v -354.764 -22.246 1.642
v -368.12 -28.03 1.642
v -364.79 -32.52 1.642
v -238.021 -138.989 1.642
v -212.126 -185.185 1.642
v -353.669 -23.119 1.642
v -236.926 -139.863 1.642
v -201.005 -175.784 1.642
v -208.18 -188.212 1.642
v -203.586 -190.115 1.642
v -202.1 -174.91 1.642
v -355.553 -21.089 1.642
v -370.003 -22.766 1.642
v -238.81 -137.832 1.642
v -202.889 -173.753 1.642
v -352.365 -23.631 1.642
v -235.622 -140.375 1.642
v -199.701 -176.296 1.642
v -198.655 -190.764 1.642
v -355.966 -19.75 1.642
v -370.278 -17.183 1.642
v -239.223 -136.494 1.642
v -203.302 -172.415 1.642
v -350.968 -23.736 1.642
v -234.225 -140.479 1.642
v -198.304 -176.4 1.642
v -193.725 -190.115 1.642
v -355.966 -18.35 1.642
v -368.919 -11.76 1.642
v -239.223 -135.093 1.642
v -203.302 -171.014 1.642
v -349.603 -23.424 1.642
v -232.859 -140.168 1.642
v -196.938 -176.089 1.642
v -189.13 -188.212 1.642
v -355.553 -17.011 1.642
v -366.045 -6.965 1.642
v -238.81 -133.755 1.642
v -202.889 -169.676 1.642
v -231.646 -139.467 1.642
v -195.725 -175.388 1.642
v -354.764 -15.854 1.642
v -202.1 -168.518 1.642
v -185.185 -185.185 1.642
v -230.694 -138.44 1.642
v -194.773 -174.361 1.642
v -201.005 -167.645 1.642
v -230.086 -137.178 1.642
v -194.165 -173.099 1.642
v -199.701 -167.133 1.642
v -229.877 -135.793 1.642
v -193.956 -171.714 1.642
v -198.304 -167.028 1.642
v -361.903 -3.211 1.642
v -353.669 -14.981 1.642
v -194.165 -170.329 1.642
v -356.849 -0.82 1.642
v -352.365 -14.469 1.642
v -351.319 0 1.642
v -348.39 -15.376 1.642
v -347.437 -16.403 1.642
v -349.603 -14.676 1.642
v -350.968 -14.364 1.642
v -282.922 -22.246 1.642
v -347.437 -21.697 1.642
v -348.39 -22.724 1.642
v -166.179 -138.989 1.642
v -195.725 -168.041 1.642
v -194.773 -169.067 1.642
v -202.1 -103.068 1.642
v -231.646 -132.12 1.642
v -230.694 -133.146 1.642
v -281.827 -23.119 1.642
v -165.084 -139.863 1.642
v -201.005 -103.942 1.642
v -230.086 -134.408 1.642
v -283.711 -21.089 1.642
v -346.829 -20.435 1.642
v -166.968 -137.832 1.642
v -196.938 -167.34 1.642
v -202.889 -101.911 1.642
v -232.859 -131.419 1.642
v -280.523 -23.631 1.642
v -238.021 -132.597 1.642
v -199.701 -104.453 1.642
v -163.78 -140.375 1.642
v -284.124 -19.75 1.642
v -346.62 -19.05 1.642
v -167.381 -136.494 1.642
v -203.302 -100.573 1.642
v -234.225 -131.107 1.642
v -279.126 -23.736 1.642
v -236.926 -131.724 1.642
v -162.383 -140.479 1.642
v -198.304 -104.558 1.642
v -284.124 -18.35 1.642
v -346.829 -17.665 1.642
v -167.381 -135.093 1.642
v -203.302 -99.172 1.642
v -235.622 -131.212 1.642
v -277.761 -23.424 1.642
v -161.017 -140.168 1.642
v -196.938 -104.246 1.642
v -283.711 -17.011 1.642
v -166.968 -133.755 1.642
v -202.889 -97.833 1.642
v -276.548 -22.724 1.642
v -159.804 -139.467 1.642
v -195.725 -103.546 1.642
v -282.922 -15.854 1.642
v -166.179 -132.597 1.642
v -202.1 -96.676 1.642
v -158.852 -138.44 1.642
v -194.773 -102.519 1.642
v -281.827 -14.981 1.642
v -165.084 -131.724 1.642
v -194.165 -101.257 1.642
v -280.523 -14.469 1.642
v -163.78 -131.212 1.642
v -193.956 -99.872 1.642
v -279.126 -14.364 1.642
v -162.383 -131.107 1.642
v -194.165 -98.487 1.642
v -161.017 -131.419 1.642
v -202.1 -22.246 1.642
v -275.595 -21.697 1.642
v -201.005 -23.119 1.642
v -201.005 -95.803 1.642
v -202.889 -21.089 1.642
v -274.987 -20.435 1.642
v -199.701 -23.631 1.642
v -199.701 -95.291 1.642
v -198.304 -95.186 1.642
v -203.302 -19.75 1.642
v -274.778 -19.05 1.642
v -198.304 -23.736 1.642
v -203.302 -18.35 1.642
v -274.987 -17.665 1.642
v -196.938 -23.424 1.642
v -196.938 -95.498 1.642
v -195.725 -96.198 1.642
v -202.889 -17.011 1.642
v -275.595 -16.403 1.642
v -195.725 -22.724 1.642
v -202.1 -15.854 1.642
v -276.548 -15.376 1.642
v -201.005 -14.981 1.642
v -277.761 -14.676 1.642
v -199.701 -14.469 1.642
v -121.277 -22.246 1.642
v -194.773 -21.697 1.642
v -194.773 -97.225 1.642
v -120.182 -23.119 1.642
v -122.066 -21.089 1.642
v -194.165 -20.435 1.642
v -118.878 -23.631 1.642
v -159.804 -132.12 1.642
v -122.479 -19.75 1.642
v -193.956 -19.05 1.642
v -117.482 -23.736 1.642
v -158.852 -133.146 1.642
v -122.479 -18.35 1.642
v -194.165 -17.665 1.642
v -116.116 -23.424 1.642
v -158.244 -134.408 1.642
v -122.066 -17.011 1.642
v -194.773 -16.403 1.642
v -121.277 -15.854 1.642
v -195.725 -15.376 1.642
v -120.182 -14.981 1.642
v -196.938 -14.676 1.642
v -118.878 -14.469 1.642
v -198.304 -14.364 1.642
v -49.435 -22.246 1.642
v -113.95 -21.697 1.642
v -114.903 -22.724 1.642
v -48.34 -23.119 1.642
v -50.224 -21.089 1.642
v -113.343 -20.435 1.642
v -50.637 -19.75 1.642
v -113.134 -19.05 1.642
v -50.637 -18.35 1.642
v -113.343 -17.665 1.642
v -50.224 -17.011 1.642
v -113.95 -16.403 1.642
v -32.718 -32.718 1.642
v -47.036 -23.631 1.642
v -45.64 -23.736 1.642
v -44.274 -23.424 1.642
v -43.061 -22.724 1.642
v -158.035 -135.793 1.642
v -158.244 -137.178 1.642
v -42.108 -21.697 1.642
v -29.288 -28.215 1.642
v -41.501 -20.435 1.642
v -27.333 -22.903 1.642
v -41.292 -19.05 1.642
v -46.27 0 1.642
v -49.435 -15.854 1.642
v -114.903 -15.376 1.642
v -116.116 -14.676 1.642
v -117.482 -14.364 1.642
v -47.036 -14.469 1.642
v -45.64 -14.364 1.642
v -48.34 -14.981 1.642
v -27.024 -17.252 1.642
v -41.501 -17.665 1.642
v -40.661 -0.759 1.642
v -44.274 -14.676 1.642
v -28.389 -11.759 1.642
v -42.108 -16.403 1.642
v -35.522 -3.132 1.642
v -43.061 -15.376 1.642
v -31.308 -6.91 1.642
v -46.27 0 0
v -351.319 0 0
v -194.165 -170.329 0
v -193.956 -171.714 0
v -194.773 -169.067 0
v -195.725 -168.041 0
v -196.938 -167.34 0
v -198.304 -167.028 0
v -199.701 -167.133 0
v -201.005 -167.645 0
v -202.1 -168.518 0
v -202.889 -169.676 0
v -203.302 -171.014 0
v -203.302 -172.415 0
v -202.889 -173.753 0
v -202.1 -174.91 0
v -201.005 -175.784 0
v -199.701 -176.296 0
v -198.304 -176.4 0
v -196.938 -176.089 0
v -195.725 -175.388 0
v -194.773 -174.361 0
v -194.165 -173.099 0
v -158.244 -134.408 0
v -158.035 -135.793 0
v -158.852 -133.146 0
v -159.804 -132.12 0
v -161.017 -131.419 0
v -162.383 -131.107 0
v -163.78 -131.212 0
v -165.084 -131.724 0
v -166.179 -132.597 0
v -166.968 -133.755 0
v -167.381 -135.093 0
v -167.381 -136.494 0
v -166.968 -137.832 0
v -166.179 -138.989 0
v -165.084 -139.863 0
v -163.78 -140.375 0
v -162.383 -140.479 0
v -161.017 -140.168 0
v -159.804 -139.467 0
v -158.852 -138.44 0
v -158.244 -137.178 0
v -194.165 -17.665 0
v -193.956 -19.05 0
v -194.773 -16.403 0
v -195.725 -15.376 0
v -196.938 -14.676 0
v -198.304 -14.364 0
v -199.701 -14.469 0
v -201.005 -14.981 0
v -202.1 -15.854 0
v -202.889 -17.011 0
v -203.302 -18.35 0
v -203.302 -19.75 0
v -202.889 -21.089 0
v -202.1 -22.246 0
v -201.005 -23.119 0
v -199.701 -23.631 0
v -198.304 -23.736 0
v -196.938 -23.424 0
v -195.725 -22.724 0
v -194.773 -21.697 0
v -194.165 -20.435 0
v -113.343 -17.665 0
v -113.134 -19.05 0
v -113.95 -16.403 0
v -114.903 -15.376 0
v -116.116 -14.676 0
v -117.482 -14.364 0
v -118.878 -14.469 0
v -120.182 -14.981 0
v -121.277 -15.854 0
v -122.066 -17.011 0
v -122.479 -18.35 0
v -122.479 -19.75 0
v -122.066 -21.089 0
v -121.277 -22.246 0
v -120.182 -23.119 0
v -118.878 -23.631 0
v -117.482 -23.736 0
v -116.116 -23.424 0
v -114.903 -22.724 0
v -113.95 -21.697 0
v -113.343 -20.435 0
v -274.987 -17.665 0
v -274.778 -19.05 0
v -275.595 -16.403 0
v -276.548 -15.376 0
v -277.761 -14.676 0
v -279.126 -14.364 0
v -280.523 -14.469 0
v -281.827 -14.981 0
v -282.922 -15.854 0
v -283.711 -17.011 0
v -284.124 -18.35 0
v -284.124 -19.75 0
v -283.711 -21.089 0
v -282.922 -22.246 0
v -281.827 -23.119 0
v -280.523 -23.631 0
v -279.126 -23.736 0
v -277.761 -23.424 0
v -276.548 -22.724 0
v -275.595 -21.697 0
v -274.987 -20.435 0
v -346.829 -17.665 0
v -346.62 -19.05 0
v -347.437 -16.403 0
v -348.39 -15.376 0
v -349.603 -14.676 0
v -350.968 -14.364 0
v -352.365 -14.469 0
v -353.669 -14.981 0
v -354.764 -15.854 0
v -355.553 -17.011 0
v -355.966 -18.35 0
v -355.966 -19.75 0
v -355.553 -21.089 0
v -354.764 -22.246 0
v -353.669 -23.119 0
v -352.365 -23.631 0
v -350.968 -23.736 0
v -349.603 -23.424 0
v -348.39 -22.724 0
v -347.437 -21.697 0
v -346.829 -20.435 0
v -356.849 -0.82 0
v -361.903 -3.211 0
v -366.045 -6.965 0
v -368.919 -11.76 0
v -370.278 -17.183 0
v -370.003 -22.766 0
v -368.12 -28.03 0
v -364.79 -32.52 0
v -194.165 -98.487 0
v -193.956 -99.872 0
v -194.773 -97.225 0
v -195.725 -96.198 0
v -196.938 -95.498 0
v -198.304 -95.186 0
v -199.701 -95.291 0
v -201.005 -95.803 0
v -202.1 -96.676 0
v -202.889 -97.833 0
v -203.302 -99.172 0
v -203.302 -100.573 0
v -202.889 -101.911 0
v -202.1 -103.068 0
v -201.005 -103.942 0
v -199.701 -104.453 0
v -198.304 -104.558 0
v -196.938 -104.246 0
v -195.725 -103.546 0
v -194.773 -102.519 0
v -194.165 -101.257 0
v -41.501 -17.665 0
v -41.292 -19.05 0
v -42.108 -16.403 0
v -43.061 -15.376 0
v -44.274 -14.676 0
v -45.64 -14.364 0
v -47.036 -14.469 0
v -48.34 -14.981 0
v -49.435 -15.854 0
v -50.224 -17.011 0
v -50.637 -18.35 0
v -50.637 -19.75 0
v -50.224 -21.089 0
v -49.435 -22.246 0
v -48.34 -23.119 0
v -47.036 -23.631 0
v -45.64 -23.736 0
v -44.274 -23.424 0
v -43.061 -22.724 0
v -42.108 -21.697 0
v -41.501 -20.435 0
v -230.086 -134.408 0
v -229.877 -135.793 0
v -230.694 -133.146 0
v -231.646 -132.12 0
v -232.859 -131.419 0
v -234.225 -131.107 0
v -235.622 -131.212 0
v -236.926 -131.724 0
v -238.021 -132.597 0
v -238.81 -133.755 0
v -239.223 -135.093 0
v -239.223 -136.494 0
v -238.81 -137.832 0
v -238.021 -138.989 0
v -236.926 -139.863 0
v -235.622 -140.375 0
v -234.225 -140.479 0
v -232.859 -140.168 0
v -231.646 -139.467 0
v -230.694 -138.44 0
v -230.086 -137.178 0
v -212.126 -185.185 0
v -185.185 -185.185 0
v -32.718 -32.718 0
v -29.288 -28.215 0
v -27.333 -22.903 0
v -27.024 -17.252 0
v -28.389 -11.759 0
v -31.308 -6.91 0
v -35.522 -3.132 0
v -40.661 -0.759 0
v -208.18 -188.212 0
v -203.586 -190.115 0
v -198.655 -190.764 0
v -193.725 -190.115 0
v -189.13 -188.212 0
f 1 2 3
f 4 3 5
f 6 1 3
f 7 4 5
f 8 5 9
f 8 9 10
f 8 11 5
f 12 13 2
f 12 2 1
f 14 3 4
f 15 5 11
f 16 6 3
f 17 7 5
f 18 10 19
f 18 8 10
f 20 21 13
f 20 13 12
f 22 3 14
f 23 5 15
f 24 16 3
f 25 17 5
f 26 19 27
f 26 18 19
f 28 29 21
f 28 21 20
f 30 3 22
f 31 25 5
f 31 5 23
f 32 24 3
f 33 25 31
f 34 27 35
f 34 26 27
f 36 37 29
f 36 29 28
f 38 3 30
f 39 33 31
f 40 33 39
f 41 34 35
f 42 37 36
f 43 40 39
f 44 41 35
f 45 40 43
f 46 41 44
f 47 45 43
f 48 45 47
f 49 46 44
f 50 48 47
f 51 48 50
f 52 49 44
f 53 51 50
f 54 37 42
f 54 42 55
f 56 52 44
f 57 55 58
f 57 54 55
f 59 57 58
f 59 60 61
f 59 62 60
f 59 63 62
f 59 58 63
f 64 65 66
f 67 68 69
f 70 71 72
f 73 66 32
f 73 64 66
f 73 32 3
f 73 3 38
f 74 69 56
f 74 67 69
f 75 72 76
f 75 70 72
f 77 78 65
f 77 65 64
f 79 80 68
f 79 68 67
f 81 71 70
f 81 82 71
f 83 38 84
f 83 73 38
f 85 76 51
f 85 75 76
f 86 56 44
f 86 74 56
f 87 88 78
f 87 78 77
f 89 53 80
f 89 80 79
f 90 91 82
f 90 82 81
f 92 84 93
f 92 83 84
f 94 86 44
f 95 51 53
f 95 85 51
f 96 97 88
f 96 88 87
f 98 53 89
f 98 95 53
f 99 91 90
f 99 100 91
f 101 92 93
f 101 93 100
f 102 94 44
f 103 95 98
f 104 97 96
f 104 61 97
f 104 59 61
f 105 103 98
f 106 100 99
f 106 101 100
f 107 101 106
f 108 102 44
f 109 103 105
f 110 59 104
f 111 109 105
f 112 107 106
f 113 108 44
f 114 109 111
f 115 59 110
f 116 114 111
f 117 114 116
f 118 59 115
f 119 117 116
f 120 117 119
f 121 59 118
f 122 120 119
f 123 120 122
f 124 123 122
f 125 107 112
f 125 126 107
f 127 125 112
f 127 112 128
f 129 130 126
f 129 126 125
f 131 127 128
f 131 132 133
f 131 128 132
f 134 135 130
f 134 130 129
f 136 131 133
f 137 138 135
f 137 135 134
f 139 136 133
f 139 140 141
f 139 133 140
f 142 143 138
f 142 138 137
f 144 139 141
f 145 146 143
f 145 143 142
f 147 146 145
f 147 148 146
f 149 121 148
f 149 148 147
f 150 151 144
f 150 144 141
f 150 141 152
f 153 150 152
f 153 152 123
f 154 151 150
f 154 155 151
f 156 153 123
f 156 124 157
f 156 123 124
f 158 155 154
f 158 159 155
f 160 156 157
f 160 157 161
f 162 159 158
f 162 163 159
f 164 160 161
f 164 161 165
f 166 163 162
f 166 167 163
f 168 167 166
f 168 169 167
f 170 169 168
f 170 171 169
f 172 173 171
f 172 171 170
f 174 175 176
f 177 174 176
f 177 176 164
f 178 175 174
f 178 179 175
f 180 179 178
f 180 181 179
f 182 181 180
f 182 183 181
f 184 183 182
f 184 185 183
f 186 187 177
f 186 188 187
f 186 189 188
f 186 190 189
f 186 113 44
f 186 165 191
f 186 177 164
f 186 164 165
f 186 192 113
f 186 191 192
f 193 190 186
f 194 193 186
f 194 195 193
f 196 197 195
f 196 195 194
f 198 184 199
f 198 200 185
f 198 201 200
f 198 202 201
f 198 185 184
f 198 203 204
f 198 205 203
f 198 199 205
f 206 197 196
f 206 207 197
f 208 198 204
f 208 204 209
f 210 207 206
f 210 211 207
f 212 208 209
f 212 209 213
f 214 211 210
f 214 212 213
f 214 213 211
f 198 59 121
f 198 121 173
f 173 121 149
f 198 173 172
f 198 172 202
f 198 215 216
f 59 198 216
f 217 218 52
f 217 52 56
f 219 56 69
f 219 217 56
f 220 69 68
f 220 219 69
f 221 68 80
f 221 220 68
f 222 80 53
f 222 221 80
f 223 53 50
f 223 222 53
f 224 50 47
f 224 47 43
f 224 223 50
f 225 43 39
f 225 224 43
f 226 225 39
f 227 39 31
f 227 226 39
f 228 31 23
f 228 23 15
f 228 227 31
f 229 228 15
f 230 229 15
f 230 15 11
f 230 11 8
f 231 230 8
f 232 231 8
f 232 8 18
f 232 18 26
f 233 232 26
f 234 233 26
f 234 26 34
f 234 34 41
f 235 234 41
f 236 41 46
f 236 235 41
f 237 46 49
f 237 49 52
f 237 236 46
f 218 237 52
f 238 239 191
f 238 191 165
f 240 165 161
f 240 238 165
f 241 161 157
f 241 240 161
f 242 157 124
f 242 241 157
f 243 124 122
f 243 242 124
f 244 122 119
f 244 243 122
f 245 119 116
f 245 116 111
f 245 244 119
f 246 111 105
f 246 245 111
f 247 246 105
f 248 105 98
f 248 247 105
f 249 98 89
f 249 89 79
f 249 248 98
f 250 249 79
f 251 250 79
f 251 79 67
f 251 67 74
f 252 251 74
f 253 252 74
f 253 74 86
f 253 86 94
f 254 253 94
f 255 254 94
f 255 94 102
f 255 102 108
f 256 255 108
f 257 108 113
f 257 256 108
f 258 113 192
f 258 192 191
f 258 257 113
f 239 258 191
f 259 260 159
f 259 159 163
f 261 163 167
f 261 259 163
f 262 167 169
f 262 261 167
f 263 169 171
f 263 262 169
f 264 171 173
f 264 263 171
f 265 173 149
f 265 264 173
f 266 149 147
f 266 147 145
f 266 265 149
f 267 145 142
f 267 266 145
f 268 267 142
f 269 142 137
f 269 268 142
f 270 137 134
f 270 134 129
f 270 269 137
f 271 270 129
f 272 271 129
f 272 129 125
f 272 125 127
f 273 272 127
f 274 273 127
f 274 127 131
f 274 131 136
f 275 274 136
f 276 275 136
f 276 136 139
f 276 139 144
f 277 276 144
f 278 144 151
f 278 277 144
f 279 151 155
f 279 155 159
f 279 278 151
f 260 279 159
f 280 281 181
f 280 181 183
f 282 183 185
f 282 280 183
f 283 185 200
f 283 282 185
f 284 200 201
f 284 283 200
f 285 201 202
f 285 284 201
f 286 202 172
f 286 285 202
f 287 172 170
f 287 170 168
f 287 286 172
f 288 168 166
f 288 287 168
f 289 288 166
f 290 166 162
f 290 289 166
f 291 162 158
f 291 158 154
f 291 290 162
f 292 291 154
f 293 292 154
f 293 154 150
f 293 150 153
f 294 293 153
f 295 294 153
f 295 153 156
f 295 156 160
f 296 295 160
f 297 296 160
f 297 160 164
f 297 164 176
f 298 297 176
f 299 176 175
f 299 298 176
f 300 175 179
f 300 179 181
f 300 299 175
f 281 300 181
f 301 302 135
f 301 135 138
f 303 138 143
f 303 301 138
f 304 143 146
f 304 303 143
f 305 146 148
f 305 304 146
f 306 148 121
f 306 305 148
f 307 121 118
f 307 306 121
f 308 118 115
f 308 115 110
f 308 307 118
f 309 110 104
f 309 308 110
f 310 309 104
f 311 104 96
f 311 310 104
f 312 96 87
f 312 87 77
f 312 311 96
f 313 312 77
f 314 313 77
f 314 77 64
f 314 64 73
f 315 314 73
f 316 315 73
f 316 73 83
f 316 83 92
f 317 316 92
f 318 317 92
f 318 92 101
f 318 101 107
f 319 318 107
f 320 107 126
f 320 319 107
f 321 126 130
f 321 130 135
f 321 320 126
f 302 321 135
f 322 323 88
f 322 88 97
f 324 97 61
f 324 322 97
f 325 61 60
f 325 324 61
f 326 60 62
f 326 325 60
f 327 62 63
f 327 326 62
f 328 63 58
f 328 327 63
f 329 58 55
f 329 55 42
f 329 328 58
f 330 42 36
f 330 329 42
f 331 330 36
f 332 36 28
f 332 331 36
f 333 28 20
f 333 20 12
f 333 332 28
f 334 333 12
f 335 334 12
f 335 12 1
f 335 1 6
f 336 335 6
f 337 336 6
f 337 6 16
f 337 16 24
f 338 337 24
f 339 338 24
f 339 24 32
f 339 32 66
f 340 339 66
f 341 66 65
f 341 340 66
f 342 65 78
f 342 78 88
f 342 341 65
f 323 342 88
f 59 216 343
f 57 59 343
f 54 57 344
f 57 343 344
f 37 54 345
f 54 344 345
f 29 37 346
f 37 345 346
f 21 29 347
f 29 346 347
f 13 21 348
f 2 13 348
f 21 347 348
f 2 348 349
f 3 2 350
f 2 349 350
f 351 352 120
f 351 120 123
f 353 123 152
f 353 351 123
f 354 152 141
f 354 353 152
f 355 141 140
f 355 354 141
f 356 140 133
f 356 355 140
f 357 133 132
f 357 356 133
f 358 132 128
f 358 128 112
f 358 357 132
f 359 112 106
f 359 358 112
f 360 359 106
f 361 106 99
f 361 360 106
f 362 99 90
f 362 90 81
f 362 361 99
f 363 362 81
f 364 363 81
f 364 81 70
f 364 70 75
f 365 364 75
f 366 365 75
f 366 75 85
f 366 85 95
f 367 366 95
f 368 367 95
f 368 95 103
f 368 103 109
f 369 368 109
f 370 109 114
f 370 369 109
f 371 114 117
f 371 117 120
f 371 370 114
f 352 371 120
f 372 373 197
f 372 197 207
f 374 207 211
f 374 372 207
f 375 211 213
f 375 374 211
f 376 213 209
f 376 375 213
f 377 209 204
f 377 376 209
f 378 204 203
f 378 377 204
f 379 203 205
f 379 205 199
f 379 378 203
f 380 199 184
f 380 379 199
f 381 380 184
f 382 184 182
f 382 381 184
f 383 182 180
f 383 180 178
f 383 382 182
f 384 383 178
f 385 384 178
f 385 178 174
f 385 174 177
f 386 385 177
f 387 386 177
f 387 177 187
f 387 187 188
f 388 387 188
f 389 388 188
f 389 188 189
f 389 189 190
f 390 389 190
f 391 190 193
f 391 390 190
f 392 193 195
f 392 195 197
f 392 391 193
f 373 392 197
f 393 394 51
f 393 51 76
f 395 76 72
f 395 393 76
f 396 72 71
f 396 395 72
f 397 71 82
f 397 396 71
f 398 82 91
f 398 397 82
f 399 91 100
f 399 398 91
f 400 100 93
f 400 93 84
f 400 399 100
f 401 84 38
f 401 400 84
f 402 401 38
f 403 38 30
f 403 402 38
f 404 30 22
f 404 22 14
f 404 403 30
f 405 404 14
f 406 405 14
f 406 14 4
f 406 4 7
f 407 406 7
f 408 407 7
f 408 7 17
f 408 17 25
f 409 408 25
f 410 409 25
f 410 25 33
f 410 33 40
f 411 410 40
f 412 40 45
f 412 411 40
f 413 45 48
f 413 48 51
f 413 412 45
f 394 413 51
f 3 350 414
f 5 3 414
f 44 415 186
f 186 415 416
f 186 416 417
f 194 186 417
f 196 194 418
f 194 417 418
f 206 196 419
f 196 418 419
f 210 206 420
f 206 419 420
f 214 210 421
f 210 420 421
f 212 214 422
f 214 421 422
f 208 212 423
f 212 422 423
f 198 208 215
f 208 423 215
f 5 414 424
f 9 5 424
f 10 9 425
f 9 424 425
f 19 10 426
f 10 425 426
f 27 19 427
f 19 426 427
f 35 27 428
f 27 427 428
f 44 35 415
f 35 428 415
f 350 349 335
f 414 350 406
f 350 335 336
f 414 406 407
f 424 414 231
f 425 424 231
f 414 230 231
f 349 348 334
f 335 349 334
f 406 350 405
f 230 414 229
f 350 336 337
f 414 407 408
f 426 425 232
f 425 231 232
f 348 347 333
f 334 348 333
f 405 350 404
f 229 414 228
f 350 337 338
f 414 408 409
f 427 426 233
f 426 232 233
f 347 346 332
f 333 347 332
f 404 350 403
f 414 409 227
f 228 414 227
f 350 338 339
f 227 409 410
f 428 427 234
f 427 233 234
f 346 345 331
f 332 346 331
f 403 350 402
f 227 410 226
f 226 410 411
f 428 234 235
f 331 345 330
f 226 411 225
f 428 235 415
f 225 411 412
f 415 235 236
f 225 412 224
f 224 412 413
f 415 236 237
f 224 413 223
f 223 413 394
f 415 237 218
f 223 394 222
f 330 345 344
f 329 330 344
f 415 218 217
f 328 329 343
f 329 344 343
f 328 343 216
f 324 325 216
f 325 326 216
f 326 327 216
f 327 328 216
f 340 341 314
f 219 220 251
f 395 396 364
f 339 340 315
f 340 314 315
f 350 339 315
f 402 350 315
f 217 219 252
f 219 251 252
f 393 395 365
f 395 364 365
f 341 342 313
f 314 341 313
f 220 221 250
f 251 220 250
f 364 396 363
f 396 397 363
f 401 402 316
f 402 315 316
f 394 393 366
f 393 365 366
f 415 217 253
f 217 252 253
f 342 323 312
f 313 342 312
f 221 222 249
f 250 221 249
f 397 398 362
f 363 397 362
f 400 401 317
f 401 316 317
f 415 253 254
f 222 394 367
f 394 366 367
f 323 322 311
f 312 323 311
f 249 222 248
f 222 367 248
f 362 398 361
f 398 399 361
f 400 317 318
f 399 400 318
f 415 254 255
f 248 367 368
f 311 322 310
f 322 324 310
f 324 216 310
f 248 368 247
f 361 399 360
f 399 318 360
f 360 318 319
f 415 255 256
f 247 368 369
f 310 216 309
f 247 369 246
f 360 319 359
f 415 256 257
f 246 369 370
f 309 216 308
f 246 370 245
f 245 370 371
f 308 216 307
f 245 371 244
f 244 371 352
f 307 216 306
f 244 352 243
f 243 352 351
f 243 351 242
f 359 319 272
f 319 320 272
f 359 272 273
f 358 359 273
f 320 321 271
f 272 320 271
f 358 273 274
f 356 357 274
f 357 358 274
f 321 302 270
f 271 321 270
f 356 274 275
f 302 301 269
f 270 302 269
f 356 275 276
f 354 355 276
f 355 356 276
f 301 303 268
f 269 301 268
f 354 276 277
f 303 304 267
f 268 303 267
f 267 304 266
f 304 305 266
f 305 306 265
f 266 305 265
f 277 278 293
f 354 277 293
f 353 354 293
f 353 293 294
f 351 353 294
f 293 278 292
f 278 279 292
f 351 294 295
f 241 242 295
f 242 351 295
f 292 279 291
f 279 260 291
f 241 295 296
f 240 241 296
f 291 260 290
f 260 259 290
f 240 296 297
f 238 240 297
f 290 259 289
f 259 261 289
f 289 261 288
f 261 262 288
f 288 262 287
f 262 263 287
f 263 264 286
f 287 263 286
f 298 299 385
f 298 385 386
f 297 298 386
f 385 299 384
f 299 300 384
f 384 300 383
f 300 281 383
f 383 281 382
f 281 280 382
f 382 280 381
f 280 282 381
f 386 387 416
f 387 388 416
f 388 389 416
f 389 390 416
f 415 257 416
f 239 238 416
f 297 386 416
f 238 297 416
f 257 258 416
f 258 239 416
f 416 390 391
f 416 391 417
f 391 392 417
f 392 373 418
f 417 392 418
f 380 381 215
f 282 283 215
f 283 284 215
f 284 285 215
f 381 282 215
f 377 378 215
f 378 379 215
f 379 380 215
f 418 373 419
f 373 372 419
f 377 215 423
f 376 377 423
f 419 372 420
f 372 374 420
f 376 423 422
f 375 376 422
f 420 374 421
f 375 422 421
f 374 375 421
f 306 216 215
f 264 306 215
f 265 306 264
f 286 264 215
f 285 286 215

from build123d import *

# Parameters (mm, degrees)
SKETCH1_R           = 4.699
BOSS_EXTRUDE3_DEPTH = 1.641793186


with BuildPart() as part:
    # Sketch1 → Boss-Extrude3 (new body)
    with BuildSketch(Plane.XY):
        with BuildLine():
            Line((-46.269533378, 0), (-351.31947646, 0))
            ThreePointArc((-351.31947646, 0), (-368.919381572, -11.759880611), (-364.789860651, -32.520384191))
            Line((-364.789860651, -32.520384191), (-212.125506603, -185.184738239))
            ThreePointArc((-212.125506603, -185.184738239), (-198.655122421, -190.764354058), (-185.184738239, -185.184738239))
            Line((-185.184738239, -185.184738239), (-32.717500753, -32.717500753))
            ThreePointArc((-32.717500753, -32.717500753), (-28.388979015, -11.759100083), (-46.269533378, 0))
        make_face()
        with Locations((-198.655122421, -19.05)):
            Circle(SKETCH1_R, mode=Mode.SUBTRACT)
        with Locations((-279.477427511, -19.05)):
            Circle(SKETCH1_R, mode=Mode.SUBTRACT)
        with Locations((-117.832817213, -19.05)):
            Circle(SKETCH1_R, mode=Mode.SUBTRACT)
        with Locations((-351.319476479, -19.05)):
            Circle(SKETCH1_R, mode=Mode.SUBTRACT)
        with Locations((-45.990768365, -19.05)):
            Circle(SKETCH1_R, mode=Mode.SUBTRACT)
        with Locations((-198.655122421, -171.714354057)):
            Circle(SKETCH1_R, mode=Mode.SUBTRACT)
        with Locations((-162.734097937, -135.793329573)):
            Circle(SKETCH1_R, mode=Mode.SUBTRACT)
        with Locations((-234.576146906, -135.793329573)):
            Circle(SKETCH1_R, mode=Mode.SUBTRACT)
        with Locations((-198.655122421, -99.872305089)):
            Circle(SKETCH1_R, mode=Mode.SUBTRACT)
    extrude(amount=BOSS_EXTRUDE3_DEPTH)


solid = part.part
